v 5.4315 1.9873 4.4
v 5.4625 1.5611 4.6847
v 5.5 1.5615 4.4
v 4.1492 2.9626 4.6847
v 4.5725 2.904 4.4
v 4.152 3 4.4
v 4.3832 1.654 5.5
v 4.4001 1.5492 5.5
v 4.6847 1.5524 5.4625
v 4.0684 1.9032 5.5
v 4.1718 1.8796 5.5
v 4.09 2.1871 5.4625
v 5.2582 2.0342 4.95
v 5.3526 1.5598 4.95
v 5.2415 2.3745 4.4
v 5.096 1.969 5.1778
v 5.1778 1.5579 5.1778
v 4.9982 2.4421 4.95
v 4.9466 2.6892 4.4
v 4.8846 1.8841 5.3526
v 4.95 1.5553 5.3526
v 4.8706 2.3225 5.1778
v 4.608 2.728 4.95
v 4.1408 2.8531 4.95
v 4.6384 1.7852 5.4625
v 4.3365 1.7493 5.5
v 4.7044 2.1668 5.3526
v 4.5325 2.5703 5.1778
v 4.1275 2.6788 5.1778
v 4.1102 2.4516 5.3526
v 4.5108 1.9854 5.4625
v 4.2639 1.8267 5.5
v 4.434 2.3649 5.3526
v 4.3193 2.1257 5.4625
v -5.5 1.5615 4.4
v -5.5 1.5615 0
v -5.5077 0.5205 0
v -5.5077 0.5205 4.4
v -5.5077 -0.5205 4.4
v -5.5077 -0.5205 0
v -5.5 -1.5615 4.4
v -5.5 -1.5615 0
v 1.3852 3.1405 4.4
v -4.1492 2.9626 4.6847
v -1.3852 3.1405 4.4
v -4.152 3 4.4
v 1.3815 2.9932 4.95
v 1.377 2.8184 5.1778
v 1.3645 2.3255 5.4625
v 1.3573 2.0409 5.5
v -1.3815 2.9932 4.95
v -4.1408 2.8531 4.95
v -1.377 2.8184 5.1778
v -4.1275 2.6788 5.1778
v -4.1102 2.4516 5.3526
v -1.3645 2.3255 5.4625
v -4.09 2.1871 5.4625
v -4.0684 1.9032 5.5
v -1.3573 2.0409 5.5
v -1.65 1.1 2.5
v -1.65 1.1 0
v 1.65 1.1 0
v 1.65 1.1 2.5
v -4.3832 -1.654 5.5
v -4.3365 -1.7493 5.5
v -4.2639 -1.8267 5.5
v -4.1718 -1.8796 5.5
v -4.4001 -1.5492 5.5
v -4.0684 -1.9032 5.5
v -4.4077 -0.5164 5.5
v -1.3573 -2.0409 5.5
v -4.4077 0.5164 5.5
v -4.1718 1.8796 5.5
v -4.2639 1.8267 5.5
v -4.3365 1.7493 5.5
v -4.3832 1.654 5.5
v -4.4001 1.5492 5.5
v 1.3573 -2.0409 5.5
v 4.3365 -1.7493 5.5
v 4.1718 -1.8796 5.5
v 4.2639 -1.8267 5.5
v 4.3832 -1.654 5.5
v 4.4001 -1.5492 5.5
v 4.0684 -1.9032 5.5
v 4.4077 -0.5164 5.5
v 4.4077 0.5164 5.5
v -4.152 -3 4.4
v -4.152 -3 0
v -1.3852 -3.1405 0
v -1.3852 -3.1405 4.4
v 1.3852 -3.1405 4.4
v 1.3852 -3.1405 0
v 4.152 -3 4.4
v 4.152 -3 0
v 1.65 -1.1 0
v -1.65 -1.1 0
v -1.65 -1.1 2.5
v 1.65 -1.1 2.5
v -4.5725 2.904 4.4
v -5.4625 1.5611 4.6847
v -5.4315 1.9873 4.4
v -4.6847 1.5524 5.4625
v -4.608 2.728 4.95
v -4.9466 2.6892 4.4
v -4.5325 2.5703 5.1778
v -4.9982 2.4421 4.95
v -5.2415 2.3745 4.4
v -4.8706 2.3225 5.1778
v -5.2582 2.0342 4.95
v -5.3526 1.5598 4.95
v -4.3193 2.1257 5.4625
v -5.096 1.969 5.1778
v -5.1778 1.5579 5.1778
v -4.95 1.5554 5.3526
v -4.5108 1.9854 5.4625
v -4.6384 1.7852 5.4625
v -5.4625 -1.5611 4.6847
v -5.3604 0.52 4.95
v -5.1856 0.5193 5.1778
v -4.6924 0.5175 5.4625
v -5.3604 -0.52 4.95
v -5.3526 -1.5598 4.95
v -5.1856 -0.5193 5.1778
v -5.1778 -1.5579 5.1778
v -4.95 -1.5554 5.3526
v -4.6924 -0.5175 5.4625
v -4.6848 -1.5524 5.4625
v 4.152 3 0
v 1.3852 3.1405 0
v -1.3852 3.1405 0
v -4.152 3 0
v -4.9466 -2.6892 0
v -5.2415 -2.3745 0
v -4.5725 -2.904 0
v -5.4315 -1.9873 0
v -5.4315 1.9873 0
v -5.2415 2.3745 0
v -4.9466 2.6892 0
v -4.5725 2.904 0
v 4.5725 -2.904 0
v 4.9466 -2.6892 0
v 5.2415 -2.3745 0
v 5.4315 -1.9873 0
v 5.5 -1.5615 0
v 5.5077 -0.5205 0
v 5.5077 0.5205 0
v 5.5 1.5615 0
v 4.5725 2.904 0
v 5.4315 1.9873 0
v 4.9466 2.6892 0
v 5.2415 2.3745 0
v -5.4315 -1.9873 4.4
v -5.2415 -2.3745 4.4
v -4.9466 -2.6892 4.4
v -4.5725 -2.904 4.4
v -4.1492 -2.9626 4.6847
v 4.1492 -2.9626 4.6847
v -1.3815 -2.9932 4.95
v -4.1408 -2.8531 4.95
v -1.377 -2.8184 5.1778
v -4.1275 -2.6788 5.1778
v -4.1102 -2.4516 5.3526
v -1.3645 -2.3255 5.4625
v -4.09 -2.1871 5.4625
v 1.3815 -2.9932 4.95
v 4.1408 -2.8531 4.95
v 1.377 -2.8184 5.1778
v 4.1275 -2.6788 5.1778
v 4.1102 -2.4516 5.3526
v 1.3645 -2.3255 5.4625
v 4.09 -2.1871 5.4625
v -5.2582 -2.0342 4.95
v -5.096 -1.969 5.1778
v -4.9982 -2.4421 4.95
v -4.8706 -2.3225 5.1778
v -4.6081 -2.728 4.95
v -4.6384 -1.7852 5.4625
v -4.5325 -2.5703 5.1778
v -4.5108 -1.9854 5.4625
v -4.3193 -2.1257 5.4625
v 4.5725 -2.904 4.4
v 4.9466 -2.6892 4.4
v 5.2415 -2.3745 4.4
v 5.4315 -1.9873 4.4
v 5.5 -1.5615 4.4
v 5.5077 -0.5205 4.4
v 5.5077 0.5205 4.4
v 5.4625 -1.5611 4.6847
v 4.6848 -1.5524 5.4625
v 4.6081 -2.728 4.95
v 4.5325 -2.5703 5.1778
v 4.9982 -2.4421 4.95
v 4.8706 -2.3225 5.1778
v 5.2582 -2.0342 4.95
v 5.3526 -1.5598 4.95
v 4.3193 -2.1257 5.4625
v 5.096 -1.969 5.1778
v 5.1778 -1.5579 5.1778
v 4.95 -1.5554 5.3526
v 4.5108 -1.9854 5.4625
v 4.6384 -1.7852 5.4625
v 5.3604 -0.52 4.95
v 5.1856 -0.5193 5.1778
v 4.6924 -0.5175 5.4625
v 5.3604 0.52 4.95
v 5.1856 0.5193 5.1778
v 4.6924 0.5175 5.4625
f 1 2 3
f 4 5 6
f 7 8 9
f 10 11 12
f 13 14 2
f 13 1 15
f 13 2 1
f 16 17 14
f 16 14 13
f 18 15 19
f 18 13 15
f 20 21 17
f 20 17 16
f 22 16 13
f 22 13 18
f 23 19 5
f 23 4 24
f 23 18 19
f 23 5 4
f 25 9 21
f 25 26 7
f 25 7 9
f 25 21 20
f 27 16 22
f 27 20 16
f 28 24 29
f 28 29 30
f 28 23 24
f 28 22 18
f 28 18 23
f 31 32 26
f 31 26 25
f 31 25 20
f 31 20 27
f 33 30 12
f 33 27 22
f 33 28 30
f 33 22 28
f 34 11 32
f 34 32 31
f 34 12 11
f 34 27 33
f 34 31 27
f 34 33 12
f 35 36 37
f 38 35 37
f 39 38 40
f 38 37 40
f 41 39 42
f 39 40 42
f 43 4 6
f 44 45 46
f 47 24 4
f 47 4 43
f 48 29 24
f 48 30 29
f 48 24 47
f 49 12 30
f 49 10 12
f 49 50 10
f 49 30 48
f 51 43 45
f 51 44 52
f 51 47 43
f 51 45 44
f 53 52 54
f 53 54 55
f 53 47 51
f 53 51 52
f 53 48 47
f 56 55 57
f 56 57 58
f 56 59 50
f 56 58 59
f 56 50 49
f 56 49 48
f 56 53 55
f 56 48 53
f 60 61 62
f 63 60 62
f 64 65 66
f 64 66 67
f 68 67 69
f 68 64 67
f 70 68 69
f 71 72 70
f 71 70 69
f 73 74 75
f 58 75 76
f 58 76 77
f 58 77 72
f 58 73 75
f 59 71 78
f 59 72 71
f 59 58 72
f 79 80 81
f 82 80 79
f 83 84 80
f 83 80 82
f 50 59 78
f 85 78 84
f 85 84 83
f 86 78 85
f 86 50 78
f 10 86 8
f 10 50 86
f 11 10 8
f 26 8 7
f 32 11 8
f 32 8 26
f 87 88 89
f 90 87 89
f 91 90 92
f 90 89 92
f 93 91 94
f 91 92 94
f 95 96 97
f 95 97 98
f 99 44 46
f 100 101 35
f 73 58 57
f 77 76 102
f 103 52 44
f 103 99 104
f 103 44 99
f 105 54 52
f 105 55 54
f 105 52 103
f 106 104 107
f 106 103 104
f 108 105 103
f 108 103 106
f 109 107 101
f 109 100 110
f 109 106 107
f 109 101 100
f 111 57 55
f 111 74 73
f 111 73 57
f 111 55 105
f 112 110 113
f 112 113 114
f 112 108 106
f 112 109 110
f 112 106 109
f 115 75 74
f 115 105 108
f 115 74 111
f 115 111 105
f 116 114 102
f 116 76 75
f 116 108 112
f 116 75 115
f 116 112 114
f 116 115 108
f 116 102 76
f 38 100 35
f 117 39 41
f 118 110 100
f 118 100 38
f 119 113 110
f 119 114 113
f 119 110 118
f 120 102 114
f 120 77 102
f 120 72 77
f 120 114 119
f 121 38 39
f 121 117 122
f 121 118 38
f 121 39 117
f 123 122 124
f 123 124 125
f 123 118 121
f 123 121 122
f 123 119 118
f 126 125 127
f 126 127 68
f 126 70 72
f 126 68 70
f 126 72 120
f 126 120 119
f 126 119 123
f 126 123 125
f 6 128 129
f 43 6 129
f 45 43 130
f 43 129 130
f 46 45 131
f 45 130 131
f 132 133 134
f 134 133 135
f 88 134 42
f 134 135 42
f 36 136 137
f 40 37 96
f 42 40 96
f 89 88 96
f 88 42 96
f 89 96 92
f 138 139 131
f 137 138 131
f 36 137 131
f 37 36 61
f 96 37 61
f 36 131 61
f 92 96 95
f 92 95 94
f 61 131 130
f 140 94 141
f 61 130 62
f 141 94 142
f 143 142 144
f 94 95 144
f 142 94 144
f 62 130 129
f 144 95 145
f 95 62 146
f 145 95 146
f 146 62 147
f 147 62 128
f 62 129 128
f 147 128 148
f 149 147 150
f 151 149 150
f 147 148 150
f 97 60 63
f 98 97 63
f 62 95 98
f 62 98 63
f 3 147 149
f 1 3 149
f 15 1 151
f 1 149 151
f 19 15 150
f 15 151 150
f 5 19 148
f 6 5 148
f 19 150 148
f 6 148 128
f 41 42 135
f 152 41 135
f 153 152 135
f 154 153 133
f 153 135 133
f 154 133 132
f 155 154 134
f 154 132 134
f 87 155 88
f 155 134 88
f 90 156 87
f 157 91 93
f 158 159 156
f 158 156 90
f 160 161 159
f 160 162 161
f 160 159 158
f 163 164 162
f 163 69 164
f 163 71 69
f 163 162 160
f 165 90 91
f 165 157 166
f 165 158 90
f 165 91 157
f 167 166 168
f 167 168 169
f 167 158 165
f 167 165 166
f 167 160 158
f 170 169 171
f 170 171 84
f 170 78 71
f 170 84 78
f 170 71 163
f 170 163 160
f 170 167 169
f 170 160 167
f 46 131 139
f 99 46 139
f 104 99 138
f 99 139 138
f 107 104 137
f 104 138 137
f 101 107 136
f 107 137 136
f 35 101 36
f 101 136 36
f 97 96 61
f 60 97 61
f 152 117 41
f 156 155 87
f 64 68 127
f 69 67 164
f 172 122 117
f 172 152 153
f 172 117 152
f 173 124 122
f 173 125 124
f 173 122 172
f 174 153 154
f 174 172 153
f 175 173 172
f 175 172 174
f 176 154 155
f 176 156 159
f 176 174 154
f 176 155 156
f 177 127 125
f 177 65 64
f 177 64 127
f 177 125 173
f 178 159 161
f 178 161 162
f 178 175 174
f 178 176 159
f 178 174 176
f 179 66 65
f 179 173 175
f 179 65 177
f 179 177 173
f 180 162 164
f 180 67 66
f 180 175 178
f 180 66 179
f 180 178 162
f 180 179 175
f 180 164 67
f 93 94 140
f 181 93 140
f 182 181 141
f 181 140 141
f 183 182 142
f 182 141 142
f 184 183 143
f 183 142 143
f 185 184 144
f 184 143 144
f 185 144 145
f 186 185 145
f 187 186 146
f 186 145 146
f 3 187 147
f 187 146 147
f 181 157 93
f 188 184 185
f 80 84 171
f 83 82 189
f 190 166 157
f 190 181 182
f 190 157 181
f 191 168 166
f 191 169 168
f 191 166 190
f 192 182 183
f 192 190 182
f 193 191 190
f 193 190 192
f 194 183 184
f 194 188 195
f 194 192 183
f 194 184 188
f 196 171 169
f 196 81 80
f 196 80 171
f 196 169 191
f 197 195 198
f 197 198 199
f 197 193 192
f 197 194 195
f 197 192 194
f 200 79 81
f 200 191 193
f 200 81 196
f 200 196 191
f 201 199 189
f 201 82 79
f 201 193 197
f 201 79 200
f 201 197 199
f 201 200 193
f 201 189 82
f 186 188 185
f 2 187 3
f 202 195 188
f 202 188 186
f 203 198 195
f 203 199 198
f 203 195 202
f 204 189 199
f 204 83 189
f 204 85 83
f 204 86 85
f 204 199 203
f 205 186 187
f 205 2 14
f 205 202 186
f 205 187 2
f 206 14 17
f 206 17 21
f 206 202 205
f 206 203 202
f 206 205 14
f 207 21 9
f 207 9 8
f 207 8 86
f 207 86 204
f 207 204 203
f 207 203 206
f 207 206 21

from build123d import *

# Parameters (mm, degrees)
SKETCH023_W  = 3.3
SKETCH023_H  = 2.2
PAD017_DEPTH = 2.5
PAD018_DEPTH = 5.5
FILLET002_R  = 1.1


with BuildPart() as clone_button_hole:
    # Sketch023 → Pad017 (new body)
    with BuildSketch(Plane.XY):
        Rectangle(SKETCH023_W, SKETCH023_H)
    extrude(amount=PAD017_DEPTH)


with BuildPart() as cut_button_med_final:
    # Sketch024 → Pad018 (new body)
    with BuildSketch(Plane.XY):
        with BuildLine():
            ThreePointArc((4.152027, 3), (0, 3.158098), (-4.152027, 3))
            ThreePointArc((-4.152027, 3), (-5.105717, 2.54284), (-5.499998, 1.561482))
            ThreePointArc((-5.499998, 1.561482), (-5.508705, 0), (-5.5, -1.561483))
            ThreePointArc((-5.5, -1.561483), (-5.105718, -2.542841), (-4.152027, -3))
            ThreePointArc((-4.152027, -3), (0, -3.158098), (4.152027, -3))
            ThreePointArc((4.152027, -3), (5.105718, -2.542841), (5.5, -1.561483))
            ThreePointArc((5.5, -1.561483), (5.508705, 0), (5.499998, 1.561482))
            ThreePointArc((5.499998, 1.561482), (5.105717, 2.54284), (4.152027, 3))
        make_face()
    extrude(amount=PAD018_DEPTH)

    # Fillet002
    fillet002_edges = [cut_button_med_final.edges().sort_by_distance(p)[0] for p in [
        (0, 3.158098, 5.5),
        (-5.105717, 2.54284, 5.5),
        (-5.508705, 0, 5.5),
        (-5.105718, -2.542841, 5.5),
        (0, -3.158098, 5.5),
        (5.105718, -2.542841, 5.5),
        (5.508705, 0, 5.5),
        (5.105717, 2.54284, 5.5),
    ]]
    fillet(fillet002_edges, radius=FILLET002_R)

    # Cut005: cut Clone (button hole)
    add(clone_button_hole.part, mode=Mode.SUBTRACT)


solid = cut_button_med_final.part
